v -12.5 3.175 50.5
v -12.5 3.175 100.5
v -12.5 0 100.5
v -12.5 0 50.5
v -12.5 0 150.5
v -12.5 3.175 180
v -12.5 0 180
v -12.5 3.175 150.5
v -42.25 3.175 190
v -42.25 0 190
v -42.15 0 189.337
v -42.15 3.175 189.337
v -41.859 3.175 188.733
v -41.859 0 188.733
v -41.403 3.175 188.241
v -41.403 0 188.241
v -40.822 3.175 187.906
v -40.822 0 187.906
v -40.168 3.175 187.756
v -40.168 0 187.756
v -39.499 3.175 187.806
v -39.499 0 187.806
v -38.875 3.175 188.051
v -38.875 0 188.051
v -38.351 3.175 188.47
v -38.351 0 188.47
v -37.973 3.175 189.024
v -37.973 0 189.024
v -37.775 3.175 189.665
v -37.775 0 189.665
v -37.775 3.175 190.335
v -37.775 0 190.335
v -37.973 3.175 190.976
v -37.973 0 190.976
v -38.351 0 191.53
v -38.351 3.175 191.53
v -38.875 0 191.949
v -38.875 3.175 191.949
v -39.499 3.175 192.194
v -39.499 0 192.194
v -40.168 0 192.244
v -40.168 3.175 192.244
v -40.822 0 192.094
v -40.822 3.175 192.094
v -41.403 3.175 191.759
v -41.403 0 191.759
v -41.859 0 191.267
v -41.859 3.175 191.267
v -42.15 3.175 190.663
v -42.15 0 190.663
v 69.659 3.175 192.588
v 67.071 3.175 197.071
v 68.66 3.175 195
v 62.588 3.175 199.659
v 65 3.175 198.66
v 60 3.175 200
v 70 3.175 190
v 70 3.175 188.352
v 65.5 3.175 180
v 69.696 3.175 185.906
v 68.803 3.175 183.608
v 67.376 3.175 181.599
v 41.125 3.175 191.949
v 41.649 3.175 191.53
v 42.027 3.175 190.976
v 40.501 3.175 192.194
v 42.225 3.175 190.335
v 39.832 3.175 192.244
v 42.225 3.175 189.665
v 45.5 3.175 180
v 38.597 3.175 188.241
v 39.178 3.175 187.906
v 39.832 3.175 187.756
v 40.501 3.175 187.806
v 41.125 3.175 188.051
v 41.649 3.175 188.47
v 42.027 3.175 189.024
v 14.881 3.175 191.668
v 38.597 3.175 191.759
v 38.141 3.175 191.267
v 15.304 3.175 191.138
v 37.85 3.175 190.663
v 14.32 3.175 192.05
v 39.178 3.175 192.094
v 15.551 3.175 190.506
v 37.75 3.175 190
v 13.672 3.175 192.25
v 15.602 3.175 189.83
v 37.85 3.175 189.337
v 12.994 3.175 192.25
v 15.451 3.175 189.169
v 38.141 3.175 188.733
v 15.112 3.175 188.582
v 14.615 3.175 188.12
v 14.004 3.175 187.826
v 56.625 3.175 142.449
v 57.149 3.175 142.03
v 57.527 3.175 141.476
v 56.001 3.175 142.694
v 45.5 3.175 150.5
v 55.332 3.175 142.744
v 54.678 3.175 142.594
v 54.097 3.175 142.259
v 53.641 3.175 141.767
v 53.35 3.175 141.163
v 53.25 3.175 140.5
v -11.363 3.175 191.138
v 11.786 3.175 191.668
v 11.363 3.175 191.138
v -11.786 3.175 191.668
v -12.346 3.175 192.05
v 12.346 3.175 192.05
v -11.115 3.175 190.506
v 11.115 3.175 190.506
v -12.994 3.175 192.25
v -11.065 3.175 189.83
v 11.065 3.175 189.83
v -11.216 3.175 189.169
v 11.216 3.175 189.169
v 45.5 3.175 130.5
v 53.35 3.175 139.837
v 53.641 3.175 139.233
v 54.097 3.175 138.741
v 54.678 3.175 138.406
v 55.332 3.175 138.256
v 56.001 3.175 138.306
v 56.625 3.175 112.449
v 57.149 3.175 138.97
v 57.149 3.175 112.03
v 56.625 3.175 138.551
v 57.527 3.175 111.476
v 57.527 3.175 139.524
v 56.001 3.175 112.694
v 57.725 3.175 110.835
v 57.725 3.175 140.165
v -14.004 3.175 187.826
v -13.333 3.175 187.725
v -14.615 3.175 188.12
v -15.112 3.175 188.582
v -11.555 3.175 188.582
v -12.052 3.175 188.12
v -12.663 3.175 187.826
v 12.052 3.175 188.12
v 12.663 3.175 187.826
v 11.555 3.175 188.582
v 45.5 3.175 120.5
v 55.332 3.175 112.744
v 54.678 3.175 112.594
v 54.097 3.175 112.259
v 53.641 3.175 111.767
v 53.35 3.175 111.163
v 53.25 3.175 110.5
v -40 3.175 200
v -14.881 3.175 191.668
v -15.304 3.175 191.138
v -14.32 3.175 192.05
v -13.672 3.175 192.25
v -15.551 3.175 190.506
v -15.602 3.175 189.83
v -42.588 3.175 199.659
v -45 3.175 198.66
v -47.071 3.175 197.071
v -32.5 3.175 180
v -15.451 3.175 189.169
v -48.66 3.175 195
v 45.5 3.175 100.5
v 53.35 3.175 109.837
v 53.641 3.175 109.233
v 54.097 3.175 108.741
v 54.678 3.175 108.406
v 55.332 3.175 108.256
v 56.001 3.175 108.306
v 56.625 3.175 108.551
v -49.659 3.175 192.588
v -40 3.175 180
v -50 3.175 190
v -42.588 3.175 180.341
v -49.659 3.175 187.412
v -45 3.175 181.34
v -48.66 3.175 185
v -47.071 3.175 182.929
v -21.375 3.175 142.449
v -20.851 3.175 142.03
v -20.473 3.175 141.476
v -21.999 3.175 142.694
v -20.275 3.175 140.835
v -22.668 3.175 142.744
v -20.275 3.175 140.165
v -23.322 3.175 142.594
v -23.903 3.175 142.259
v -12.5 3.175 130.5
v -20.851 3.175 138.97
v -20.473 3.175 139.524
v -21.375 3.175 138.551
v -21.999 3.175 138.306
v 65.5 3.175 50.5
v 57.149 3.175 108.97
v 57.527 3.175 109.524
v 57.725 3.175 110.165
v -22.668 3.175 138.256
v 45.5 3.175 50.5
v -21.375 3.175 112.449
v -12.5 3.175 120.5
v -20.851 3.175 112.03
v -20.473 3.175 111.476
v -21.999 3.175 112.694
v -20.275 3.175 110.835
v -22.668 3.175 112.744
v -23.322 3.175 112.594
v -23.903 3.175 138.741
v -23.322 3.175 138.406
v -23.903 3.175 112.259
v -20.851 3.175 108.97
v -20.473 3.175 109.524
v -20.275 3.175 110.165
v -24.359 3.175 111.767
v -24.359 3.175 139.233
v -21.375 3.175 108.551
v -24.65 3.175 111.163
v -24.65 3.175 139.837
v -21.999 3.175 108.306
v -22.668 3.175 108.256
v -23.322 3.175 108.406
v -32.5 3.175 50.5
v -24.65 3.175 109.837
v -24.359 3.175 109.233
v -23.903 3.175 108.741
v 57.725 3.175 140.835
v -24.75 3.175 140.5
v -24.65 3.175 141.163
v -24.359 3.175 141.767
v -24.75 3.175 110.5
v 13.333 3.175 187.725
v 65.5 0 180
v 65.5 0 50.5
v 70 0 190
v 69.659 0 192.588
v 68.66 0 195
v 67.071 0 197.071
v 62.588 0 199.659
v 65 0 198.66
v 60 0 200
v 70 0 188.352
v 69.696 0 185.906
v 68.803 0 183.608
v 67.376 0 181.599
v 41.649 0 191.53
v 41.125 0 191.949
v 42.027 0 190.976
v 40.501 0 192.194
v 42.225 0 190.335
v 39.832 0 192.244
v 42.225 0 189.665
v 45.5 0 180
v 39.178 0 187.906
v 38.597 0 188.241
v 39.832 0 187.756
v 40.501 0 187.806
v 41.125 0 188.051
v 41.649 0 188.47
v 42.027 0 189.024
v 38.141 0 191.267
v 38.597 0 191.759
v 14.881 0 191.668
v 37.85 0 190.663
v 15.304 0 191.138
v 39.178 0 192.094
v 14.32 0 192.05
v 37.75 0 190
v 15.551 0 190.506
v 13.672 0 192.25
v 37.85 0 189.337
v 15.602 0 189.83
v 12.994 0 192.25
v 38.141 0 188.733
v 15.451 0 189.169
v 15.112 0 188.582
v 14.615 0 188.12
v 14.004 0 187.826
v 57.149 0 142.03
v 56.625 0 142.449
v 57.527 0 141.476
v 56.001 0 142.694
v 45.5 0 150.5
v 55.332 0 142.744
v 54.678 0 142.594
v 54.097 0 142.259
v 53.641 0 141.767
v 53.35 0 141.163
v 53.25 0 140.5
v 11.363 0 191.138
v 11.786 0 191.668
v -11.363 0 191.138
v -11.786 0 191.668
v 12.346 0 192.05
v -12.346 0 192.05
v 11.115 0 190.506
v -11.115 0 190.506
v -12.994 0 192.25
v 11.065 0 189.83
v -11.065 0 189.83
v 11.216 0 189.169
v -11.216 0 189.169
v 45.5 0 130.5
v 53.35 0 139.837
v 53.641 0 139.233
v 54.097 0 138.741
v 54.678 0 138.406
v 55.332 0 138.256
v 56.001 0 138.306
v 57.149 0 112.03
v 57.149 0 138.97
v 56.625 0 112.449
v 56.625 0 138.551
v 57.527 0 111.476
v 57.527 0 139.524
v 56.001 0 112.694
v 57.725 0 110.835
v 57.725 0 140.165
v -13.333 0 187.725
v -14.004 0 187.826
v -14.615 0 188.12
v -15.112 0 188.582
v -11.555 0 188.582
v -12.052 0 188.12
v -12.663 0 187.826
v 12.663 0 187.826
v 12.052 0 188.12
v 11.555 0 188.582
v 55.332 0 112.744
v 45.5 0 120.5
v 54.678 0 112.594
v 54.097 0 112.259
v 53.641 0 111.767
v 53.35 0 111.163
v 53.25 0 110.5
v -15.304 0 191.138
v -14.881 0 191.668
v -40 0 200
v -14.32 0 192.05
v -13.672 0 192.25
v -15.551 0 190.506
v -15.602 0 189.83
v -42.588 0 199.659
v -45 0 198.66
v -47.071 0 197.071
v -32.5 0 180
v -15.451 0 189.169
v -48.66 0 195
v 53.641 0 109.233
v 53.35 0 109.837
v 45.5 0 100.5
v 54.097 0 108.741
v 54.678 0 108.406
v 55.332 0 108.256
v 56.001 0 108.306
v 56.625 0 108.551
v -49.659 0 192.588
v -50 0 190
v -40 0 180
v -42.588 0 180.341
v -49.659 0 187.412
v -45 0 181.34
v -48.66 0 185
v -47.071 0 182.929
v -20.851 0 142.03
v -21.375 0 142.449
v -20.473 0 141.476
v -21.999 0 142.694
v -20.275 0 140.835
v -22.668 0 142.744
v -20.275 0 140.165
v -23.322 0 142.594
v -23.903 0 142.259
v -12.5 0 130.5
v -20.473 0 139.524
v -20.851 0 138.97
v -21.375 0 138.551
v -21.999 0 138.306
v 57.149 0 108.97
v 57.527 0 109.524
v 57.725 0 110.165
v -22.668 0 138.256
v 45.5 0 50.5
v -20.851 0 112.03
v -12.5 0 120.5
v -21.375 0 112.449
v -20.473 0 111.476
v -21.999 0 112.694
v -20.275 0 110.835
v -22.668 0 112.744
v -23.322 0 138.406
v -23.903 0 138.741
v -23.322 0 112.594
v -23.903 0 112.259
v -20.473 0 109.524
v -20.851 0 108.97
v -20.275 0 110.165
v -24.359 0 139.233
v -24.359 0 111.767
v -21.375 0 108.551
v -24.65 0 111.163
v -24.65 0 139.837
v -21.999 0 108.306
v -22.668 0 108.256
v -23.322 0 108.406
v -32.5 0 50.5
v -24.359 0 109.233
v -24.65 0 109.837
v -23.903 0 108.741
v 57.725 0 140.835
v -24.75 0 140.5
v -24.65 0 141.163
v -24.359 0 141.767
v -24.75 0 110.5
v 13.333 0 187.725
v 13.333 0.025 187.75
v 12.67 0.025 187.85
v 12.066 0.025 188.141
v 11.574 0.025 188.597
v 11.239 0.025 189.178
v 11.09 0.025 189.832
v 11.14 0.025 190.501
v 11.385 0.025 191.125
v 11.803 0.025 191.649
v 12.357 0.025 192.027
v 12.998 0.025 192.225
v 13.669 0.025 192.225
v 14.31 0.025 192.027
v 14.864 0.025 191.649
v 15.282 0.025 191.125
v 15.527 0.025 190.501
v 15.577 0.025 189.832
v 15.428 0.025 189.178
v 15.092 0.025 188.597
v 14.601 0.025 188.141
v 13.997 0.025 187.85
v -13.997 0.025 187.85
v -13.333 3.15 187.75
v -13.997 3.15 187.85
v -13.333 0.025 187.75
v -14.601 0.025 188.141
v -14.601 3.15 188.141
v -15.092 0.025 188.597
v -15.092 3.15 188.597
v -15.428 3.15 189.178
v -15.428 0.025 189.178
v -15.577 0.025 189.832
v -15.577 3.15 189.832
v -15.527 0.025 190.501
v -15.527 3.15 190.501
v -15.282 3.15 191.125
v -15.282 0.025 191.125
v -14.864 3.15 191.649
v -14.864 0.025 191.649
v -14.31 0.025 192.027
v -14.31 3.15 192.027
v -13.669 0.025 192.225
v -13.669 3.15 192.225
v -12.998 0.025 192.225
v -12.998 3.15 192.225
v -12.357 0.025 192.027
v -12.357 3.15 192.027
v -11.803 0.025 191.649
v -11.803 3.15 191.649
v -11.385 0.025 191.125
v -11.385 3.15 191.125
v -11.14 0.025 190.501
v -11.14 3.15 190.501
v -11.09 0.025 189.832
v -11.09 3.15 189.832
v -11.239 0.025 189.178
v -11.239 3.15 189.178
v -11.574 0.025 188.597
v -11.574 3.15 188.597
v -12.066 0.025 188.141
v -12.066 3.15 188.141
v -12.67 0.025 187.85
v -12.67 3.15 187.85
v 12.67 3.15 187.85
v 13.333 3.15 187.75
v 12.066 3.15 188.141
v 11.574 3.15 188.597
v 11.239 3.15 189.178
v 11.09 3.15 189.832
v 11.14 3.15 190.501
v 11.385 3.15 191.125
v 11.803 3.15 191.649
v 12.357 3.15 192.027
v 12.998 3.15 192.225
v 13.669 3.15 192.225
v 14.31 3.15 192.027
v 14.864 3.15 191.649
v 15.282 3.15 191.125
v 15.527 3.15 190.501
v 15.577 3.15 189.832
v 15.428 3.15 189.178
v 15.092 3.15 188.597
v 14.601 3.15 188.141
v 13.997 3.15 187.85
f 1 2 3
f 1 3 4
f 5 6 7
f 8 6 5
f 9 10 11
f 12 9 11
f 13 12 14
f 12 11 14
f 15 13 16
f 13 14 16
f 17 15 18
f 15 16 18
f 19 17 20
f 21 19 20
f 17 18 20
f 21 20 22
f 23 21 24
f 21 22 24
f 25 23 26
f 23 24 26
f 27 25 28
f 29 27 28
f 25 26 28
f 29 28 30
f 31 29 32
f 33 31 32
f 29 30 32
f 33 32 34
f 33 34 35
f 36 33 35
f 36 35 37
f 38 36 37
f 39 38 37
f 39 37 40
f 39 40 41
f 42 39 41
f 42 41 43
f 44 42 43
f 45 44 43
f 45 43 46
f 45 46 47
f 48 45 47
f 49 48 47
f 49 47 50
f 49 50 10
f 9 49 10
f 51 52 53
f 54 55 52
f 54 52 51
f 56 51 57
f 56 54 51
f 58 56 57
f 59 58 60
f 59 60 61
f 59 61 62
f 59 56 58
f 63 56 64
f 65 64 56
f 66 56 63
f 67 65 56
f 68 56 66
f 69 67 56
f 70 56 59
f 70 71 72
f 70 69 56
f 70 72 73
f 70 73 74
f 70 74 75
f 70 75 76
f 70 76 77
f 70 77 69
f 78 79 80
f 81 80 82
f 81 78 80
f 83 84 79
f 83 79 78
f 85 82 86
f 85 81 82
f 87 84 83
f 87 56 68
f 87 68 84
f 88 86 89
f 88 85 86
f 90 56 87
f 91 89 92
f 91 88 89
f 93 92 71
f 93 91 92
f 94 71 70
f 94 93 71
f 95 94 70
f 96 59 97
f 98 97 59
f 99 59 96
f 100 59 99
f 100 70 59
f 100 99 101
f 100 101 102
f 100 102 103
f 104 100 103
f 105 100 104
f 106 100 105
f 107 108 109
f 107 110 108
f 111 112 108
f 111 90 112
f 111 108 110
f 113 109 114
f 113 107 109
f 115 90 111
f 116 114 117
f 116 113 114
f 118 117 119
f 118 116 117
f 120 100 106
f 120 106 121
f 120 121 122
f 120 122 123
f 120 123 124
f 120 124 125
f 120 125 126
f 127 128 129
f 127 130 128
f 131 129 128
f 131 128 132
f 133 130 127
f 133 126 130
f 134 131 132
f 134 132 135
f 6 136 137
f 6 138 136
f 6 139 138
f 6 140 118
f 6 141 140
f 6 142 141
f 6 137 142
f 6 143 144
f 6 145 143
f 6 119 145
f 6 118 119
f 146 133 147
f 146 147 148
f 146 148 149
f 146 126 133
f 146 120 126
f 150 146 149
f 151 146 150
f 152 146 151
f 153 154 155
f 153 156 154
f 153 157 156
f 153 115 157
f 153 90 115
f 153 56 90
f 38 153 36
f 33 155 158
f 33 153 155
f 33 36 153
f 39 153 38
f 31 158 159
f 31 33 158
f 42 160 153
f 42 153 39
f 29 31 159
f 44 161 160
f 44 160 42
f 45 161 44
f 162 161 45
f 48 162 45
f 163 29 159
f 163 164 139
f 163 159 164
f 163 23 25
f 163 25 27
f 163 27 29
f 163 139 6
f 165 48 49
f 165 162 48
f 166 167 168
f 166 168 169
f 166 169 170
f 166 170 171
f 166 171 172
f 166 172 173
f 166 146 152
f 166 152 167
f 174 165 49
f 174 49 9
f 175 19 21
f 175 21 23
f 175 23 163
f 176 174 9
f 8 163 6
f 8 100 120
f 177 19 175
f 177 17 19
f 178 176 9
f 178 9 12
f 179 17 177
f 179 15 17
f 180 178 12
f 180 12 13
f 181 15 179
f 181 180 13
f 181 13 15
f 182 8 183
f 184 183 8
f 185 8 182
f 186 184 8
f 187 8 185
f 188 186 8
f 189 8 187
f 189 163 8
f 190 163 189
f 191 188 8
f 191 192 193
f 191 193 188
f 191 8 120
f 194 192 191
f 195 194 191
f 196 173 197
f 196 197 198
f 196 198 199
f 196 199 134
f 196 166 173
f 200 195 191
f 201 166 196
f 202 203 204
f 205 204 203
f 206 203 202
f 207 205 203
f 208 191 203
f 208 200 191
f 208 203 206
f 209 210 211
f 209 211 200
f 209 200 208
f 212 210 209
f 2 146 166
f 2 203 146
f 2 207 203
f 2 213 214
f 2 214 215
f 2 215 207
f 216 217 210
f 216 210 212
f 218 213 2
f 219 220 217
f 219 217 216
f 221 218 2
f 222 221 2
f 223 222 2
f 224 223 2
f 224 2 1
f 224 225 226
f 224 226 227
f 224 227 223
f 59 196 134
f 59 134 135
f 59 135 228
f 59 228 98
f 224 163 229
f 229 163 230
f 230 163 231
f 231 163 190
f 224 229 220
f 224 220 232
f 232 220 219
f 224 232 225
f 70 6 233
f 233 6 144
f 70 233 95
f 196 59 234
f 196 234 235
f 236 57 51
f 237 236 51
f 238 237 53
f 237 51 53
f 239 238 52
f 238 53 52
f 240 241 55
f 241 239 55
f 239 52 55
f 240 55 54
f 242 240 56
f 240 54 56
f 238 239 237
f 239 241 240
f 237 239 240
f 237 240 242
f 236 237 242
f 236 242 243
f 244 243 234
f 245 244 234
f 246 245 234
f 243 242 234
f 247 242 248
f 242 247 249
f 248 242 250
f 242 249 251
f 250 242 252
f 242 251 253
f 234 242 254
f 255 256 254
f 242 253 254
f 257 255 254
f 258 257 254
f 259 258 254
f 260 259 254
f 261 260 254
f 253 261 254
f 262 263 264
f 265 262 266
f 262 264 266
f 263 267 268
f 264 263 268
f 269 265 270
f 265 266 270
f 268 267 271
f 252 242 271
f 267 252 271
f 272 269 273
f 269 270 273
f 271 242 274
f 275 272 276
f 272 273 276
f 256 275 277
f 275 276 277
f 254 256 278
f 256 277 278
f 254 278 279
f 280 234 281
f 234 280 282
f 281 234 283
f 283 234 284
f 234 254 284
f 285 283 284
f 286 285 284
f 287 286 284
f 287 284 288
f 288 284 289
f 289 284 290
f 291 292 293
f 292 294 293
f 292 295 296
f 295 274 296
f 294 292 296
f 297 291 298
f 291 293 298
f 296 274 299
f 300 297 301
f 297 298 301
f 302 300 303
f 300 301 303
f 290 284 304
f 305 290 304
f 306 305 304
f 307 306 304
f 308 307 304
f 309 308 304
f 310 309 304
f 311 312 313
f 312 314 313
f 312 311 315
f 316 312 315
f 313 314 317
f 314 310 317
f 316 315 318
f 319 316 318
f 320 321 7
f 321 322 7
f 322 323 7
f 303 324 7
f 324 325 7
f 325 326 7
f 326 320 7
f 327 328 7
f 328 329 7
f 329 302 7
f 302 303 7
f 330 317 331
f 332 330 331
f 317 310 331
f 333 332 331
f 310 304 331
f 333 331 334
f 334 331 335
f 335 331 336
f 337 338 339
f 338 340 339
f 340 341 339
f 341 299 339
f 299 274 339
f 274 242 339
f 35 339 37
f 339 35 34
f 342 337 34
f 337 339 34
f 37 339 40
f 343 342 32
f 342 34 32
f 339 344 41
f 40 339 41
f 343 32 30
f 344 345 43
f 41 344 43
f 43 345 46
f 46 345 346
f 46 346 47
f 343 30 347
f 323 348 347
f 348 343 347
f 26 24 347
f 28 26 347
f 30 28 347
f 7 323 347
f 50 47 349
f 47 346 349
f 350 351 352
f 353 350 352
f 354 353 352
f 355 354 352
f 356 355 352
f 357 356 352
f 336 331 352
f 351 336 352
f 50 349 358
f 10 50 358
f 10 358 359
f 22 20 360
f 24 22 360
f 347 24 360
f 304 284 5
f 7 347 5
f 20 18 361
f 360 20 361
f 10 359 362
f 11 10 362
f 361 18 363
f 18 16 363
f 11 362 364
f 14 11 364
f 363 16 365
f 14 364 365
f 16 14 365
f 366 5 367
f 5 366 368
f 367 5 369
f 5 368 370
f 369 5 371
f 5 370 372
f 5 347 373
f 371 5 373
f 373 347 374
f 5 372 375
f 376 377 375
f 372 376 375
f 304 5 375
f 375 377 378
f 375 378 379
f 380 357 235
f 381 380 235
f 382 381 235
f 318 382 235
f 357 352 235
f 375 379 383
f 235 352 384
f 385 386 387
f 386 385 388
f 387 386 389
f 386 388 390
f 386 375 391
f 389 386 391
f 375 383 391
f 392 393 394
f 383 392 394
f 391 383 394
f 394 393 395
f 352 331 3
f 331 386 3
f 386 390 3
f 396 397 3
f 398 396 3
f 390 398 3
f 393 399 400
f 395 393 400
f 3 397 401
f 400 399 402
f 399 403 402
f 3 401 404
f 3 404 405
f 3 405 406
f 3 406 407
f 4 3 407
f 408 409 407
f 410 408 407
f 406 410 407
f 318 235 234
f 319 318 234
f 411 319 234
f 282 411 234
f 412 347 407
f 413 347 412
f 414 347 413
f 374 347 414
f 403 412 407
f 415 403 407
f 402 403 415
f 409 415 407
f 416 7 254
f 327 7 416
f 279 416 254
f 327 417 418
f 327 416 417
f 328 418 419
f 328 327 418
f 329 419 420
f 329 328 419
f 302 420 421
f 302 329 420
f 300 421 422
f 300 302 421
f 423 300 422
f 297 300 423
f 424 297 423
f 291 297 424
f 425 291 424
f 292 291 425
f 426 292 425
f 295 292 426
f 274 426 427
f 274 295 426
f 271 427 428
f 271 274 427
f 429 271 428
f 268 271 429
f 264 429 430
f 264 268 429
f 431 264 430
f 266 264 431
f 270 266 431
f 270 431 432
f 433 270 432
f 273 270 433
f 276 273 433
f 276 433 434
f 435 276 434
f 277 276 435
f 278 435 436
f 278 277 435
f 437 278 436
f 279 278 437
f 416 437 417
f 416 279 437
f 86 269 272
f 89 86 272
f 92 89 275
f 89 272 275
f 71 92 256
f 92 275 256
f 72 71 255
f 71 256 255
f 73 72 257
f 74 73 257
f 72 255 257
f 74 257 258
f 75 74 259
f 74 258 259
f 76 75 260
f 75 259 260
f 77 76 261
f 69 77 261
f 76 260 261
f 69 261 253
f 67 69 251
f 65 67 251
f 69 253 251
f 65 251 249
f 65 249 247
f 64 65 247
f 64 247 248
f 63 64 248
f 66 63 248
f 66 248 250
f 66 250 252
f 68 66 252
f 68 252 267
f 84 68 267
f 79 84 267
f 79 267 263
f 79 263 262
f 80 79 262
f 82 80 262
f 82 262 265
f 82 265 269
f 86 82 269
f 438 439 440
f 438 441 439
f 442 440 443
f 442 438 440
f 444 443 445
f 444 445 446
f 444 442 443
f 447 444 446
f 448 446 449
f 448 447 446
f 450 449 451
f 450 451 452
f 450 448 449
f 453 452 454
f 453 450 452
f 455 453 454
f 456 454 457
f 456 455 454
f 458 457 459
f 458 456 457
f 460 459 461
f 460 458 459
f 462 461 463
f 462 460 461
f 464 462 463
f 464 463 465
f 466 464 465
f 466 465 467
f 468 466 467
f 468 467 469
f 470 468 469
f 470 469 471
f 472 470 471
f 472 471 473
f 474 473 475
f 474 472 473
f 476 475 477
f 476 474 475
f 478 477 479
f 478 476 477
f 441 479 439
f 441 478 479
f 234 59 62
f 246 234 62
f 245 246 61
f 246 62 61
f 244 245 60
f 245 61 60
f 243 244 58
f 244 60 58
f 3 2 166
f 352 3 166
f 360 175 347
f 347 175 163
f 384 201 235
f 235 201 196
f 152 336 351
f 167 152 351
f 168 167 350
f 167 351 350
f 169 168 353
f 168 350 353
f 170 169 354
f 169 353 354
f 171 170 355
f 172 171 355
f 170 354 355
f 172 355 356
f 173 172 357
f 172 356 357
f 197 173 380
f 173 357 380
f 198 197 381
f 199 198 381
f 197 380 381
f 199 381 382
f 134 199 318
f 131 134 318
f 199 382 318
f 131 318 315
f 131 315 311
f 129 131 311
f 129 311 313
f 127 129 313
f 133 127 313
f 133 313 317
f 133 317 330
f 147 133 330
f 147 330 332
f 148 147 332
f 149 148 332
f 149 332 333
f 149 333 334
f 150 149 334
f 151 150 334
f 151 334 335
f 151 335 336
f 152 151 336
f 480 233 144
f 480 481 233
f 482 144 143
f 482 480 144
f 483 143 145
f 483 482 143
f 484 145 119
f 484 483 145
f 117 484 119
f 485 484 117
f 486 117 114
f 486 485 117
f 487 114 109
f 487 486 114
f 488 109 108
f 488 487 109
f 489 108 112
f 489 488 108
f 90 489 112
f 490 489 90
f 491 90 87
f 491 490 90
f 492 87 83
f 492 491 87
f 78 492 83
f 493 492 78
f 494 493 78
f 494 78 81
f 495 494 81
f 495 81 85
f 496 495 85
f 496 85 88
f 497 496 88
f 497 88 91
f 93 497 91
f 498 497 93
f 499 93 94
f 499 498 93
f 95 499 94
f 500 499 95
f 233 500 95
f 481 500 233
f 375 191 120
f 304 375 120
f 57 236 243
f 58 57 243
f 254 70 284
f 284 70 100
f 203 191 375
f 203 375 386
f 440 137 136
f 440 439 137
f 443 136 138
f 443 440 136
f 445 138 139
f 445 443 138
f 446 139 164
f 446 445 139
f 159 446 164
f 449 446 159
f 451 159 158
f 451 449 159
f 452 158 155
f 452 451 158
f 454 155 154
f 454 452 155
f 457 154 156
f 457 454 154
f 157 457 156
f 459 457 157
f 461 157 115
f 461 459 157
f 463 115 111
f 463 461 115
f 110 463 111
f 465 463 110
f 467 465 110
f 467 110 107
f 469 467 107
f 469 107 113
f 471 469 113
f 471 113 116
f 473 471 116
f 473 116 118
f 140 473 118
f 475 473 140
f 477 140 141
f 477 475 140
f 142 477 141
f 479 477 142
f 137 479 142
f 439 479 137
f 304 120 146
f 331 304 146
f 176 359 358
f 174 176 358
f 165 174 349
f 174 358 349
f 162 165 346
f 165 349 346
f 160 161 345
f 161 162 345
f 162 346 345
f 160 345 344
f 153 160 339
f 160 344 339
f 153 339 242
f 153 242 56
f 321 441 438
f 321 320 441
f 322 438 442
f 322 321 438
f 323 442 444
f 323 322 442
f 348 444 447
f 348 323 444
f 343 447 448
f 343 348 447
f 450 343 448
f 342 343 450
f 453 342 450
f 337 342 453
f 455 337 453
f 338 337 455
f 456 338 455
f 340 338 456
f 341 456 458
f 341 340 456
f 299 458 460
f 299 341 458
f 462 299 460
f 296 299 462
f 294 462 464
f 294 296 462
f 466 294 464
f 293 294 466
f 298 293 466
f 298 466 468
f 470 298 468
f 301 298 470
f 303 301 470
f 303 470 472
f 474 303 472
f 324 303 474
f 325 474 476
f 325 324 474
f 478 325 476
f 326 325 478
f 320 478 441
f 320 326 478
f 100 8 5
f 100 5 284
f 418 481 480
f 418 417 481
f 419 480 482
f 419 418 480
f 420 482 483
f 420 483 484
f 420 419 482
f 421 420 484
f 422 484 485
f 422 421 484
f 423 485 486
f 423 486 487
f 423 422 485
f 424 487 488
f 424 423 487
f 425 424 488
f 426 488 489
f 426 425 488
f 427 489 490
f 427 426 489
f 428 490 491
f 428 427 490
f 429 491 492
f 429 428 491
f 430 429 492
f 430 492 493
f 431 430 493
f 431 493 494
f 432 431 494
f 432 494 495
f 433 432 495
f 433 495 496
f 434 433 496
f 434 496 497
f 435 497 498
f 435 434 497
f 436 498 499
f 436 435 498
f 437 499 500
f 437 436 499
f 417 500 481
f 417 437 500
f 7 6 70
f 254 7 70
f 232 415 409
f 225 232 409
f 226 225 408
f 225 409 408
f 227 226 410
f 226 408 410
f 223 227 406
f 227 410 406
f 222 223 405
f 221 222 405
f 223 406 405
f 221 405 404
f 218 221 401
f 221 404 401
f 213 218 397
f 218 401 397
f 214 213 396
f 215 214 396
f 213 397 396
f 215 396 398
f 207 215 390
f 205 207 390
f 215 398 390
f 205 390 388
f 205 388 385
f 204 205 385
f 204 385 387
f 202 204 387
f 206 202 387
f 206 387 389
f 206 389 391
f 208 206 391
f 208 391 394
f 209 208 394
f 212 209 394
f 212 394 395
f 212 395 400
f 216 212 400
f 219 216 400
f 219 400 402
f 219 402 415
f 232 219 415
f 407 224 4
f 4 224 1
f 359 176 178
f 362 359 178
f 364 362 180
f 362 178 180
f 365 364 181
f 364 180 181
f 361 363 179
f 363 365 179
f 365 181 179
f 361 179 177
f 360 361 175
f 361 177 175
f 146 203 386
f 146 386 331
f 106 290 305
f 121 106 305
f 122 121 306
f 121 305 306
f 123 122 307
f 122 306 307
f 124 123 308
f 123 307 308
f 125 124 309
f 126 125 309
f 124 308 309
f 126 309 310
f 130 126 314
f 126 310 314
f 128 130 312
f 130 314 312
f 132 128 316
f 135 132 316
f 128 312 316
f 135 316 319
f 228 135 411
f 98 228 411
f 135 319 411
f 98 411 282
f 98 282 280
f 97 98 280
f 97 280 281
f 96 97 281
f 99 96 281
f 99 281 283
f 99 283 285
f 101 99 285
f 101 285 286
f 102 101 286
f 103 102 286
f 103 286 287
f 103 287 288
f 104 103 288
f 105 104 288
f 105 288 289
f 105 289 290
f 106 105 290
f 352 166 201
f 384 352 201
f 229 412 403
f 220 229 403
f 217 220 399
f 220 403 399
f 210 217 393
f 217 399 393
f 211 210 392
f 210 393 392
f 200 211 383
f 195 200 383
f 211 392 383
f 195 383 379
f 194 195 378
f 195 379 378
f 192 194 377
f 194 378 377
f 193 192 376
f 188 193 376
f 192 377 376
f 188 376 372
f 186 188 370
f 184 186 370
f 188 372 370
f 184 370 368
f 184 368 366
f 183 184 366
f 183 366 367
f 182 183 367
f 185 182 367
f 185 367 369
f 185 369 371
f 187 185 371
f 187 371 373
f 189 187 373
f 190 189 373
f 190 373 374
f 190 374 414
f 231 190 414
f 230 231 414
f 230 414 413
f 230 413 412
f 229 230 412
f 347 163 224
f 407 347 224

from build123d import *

# Parameters (mm, degrees)
SKETCH1_W                     = 100
SKETCH1_H                     = 400
BOSS_EXTRUDE1_DEPTH           = 3.175
M4_CLEARANCE_HOLE2_D          = 4.5
SKETCH7_W                     = 400
SKETCH7_H                     = 3.175
BOSS_EXTRUDE2_DEPTH           = 20
M4_CLEARANCE_HOLE1_D          = 4.5
SKETCH13_W                    = 17.5
SKETCH13_H                    = 265
SKETCH13_W_2                  = 58
SKETCH13_H_2                  = 69.5
SKETCH13_W_3                  = 4.5
SKETCH13_H_3                  = 66
SKETCH13_H_4                  = 10
SKETCH13_H_5                  = 29.5
SKETCH13_H_6                  = 75
CUT_EXTRUDE1_DEPTH            = 3.175
FILLET1_R                     = 10
SKETCH14_W                    = 120
SKETCH14_H                    = 250.5
CUT_EXTRUDE2_DEPTH            = 3.175
M4_CLEARANCE_HOLE3_AT_2_COUNT = 2
M4_CLEARANCE_HOLE3_AT_2_PITCH = 26.666666667


with BuildPart() as part:
    # Sketch1 → Boss-Extrude1 (new body)
    with BuildSketch(Plane(origin=(0, 0, 0), x_dir=(1, 0, 0), z_dir=(0, 1, 0))):
        Rectangle(SKETCH1_W, SKETCH1_H)
    extrude(amount=BOSS_EXTRUDE1_DEPTH)

    # M4 Clearance Hole2 (through all)
    with Locations(Plane(origin=(0, 3.175, 0), x_dir=(1, 0, 0), z_dir=(0, 1, 0))):
        with Locations((-40, 190), (40, 190), (40, -190), (-40, -190), (-40, 95), (40, 95)):
            Hole(M4_CLEARANCE_HOLE2_D / 2)

    # Sketch7 → Boss-Extrude2 (add)
    with BuildSketch(Plane(origin=(50, 0, 0), x_dir=(0, 0, -1), z_dir=(1, 0, 0))):
        with Locations((0, 1.5875)):
            Rectangle(SKETCH7_W, SKETCH7_H)
    extrude(amount=BOSS_EXTRUDE2_DEPTH)

    # M4 Clearance Hole1 (through all)
    with Locations(Plane(origin=(0, 3.175, 0), x_dir=(1, 0, 0), z_dir=(0, 1, 0))):
        with Locations((55.5, -140.5), (55.5, -110.5), (-22.5, -110.5), (-22.5, -140.5), (-22.5, -24.5), (-22.5, 5.5), (55.5, 5.5), (55.5, -24.5)):
            Hole(M4_CLEARANCE_HOLE1_D / 2)

    # Sketch13 → Cut-Extrude1 (cut)
    with BuildSketch(Plane(origin=(0, 3.175, 0), x_dir=(1, 0, 0), z_dir=(0, 1, 0))):
        with Locations((-41.25, -47.5)):
            Rectangle(SKETCH13_W, SKETCH13_H)
        with Locations((16.5, 50.25)):
            Rectangle(SKETCH13_W_2, SKETCH13_H_2)
        with Locations((67.75, -47.5)):
            Rectangle(SKETCH13_W_3, SKETCH13_H)
        with Locations((16.5, -67.5)):
            Rectangle(SKETCH13_W_2, SKETCH13_H_3)
        with Locations((16.5, -125.5)):
            Rectangle(SKETCH13_W_2, SKETCH13_H_4)
        with Locations((16.5, -165.25)):
            Rectangle(SKETCH13_W_2, SKETCH13_H_5)
        with Locations((-41.25, 142.5)):
            Rectangle(SKETCH13_W, SKETCH13_H_6)
        with Locations((16.5, 142.5)):
            Rectangle(SKETCH13_W_2, SKETCH13_H_6)
        with Locations((67.75, 142.5)):
            Rectangle(SKETCH13_W_3, SKETCH13_H_6)
        with Locations((16.5, -9.5)):
            Rectangle(SKETCH13_W_2, SKETCH13_H_4)
    extrude(amount=-CUT_EXTRUDE1_DEPTH, mode=Mode.SUBTRACT)

    # Fillet1
    # the kernel refuses this fillet: 10 mm, written as the material it takes off along each edge
    with BuildSketch(Plane(origin=(70, 24.054116361, -180), x_dir=(0, 0, -1), z_dir=(0, -1, 0)), Plane(origin=(70, 24.054116361, -85), x_dir=(0, 0, -1), z_dir=(0, -1, 0))) as fillet1_piece_1:
        with BuildLine():
            CenterArc((8.351646544, -10), FILLET1_R, 90, 56.632987031)
            Line((0, -4.5), (-0.167032931, -4.39))
            ThreePointArc((-0.167032931, -4.39), (-0.2, -2.25), (-0.2, 0))
            Line((-0.2, 0), (0, 0.2))
            Line((0, 0.2), (8.351646544, 0.2))
            Line((8.351646544, 0.2), (8.351646544, 0))
        make_face()
    extrude(amount=44.933232721, mode=Mode.SUBTRACT)
    with BuildSketch(Plane(origin=(70, -25, -200), x_dir=(-1, 0, 0), z_dir=(0, 1, 0)), Plane(origin=(-50, -25, -200), x_dir=(0, 0, 1), z_dir=(0, 1, 0)), Plane(origin=(70, 28.175, 200), x_dir=(-1, 0, 0), z_dir=(0, -1, 0)), Plane(origin=(-50, -25, 200), x_dir=(1, 0, 0), z_dir=(0, 1, 0))) as fillet1_piece_2:
        with BuildLine():
            CenterArc((FILLET1_R, FILLET1_R), FILLET1_R, 180, 90)
            Line((0, FILLET1_R), (-FILLET1_R * 0.02, FILLET1_R))
            Line((-FILLET1_R * 0.02, FILLET1_R), (-FILLET1_R * 0.02, -FILLET1_R * 0.02))
            Line((-FILLET1_R * 0.02, -FILLET1_R * 0.02), (FILLET1_R, -FILLET1_R * 0.02))
            Line((FILLET1_R, -FILLET1_R * 0.02), (FILLET1_R, 0))
        make_face()
    extrude(amount=53.175, mode=Mode.SUBTRACT)
    with BuildSketch(Plane(origin=(-50, 28.175, -180), x_dir=(1, 0, 0), z_dir=(0, -1, 0)), Plane(origin=(-50, 28.175, -85), x_dir=(1, 0, 0), z_dir=(0, -1, 0)), Plane(origin=(-50, 28.175, -105), x_dir=(0, 0, 1), z_dir=(0, -1, 0)), Plane(origin=(-50, 28.175, 180), x_dir=(0, 0, 1), z_dir=(0, -1, 0))) as fillet1_piece_3:
        with BuildLine():
            CenterArc((FILLET1_R, -FILLET1_R), FILLET1_R, 90, 90)
            Line((0, -FILLET1_R), (-FILLET1_R * 0.02, -FILLET1_R))
            Line((-FILLET1_R * 0.02, -FILLET1_R), (-FILLET1_R * 0.02, FILLET1_R * 0.02))
            Line((-FILLET1_R * 0.02, FILLET1_R * 0.02), (FILLET1_R, FILLET1_R * 0.02))
            Line((FILLET1_R, FILLET1_R * 0.02), (FILLET1_R, 0))
        make_face()
    extrude(amount=53.175, mode=Mode.SUBTRACT)
    with BuildSketch(Plane(origin=(70, 24.054116361, -105), x_dir=(-1.0, 0, 1.5347723092402606e-12), z_dir=(0, -1, 0))) as fillet1_piece_4:
        with BuildLine():
            CenterArc((10, -8.351646544), FILLET1_R, 123.367012969, 56.632987031)
            Line((0, -8.351646544), (-0.2, -8.351646544))
            Line((-0.2, -8.351646544), (-0.2, 0))
            Line((-0.2, 0), (0, 0.2))
            ThreePointArc((0, 0.2), (2.25, 0.2), (4.39, 0.167032931))
            Line((4.39, 0.167032931), (4.5, 0))
        make_face()
    extrude(amount=44.933232721, mode=Mode.SUBTRACT)
    with BuildSketch(Plane(origin=(70, 24.054116361, 180), x_dir=(0, 0, 1), z_dir=(0, -1, 0))) as fillet1_piece_5:
        with BuildLine():
            CenterArc((8.351646544, 10), FILLET1_R, 213.367012969, 56.632987031)
            Line((0, 4.5), (-0.167032931, 4.39))
            ThreePointArc((-0.167032931, 4.39), (-0.2, 2.25), (-0.2, 0))
            Line((-0.2, 0), (0, -0.2))
            Line((0, -0.2), (8.351646544, -0.2))
            Line((8.351646544, -0.2), (8.351646544, 0))
        make_face()
    extrude(amount=44.933232721, mode=Mode.SUBTRACT)

    # Sketch14 → Cut-Extrude2 (cut)
    with BuildSketch(Plane(origin=(0, 3.175, 0), x_dir=(1, 0, 0), z_dir=(0, 1, 0))):
        with Locations((10, 74.75)):
            Rectangle(SKETCH14_W, SKETCH14_H)
    extrude(amount=-CUT_EXTRUDE2_DEPTH, mode=Mode.SUBTRACT)

    # Sketch16 → M4 Clearance Hole3 (revolve, cut)
    with BuildSketch(Plane(origin=(13.333333333, 0, 190), x_dir=(0, 0, -1), z_dir=(1, 0, 0))):
        Polygon((0, 0), (0, 3.175), (2.275, 3.175), (2.25, 3.15), (2.25, 0.025), (2.275, 0), align=None)
    m4_clearance_hole3 = revolve(axis=Axis((13.333333333, -6.35, 190), (0, 1, 0)), mode=Mode.SUBTRACT)

    # M4 Clearance Hole3 at 2: M4 Clearance Hole3 ×2
    with Locations(*[(-i * M4_CLEARANCE_HOLE3_AT_2_PITCH, 0, 0) for i in range(1, M4_CLEARANCE_HOLE3_AT_2_COUNT)]):
        add(m4_clearance_hole3, mode=Mode.SUBTRACT)


solid = part.part
